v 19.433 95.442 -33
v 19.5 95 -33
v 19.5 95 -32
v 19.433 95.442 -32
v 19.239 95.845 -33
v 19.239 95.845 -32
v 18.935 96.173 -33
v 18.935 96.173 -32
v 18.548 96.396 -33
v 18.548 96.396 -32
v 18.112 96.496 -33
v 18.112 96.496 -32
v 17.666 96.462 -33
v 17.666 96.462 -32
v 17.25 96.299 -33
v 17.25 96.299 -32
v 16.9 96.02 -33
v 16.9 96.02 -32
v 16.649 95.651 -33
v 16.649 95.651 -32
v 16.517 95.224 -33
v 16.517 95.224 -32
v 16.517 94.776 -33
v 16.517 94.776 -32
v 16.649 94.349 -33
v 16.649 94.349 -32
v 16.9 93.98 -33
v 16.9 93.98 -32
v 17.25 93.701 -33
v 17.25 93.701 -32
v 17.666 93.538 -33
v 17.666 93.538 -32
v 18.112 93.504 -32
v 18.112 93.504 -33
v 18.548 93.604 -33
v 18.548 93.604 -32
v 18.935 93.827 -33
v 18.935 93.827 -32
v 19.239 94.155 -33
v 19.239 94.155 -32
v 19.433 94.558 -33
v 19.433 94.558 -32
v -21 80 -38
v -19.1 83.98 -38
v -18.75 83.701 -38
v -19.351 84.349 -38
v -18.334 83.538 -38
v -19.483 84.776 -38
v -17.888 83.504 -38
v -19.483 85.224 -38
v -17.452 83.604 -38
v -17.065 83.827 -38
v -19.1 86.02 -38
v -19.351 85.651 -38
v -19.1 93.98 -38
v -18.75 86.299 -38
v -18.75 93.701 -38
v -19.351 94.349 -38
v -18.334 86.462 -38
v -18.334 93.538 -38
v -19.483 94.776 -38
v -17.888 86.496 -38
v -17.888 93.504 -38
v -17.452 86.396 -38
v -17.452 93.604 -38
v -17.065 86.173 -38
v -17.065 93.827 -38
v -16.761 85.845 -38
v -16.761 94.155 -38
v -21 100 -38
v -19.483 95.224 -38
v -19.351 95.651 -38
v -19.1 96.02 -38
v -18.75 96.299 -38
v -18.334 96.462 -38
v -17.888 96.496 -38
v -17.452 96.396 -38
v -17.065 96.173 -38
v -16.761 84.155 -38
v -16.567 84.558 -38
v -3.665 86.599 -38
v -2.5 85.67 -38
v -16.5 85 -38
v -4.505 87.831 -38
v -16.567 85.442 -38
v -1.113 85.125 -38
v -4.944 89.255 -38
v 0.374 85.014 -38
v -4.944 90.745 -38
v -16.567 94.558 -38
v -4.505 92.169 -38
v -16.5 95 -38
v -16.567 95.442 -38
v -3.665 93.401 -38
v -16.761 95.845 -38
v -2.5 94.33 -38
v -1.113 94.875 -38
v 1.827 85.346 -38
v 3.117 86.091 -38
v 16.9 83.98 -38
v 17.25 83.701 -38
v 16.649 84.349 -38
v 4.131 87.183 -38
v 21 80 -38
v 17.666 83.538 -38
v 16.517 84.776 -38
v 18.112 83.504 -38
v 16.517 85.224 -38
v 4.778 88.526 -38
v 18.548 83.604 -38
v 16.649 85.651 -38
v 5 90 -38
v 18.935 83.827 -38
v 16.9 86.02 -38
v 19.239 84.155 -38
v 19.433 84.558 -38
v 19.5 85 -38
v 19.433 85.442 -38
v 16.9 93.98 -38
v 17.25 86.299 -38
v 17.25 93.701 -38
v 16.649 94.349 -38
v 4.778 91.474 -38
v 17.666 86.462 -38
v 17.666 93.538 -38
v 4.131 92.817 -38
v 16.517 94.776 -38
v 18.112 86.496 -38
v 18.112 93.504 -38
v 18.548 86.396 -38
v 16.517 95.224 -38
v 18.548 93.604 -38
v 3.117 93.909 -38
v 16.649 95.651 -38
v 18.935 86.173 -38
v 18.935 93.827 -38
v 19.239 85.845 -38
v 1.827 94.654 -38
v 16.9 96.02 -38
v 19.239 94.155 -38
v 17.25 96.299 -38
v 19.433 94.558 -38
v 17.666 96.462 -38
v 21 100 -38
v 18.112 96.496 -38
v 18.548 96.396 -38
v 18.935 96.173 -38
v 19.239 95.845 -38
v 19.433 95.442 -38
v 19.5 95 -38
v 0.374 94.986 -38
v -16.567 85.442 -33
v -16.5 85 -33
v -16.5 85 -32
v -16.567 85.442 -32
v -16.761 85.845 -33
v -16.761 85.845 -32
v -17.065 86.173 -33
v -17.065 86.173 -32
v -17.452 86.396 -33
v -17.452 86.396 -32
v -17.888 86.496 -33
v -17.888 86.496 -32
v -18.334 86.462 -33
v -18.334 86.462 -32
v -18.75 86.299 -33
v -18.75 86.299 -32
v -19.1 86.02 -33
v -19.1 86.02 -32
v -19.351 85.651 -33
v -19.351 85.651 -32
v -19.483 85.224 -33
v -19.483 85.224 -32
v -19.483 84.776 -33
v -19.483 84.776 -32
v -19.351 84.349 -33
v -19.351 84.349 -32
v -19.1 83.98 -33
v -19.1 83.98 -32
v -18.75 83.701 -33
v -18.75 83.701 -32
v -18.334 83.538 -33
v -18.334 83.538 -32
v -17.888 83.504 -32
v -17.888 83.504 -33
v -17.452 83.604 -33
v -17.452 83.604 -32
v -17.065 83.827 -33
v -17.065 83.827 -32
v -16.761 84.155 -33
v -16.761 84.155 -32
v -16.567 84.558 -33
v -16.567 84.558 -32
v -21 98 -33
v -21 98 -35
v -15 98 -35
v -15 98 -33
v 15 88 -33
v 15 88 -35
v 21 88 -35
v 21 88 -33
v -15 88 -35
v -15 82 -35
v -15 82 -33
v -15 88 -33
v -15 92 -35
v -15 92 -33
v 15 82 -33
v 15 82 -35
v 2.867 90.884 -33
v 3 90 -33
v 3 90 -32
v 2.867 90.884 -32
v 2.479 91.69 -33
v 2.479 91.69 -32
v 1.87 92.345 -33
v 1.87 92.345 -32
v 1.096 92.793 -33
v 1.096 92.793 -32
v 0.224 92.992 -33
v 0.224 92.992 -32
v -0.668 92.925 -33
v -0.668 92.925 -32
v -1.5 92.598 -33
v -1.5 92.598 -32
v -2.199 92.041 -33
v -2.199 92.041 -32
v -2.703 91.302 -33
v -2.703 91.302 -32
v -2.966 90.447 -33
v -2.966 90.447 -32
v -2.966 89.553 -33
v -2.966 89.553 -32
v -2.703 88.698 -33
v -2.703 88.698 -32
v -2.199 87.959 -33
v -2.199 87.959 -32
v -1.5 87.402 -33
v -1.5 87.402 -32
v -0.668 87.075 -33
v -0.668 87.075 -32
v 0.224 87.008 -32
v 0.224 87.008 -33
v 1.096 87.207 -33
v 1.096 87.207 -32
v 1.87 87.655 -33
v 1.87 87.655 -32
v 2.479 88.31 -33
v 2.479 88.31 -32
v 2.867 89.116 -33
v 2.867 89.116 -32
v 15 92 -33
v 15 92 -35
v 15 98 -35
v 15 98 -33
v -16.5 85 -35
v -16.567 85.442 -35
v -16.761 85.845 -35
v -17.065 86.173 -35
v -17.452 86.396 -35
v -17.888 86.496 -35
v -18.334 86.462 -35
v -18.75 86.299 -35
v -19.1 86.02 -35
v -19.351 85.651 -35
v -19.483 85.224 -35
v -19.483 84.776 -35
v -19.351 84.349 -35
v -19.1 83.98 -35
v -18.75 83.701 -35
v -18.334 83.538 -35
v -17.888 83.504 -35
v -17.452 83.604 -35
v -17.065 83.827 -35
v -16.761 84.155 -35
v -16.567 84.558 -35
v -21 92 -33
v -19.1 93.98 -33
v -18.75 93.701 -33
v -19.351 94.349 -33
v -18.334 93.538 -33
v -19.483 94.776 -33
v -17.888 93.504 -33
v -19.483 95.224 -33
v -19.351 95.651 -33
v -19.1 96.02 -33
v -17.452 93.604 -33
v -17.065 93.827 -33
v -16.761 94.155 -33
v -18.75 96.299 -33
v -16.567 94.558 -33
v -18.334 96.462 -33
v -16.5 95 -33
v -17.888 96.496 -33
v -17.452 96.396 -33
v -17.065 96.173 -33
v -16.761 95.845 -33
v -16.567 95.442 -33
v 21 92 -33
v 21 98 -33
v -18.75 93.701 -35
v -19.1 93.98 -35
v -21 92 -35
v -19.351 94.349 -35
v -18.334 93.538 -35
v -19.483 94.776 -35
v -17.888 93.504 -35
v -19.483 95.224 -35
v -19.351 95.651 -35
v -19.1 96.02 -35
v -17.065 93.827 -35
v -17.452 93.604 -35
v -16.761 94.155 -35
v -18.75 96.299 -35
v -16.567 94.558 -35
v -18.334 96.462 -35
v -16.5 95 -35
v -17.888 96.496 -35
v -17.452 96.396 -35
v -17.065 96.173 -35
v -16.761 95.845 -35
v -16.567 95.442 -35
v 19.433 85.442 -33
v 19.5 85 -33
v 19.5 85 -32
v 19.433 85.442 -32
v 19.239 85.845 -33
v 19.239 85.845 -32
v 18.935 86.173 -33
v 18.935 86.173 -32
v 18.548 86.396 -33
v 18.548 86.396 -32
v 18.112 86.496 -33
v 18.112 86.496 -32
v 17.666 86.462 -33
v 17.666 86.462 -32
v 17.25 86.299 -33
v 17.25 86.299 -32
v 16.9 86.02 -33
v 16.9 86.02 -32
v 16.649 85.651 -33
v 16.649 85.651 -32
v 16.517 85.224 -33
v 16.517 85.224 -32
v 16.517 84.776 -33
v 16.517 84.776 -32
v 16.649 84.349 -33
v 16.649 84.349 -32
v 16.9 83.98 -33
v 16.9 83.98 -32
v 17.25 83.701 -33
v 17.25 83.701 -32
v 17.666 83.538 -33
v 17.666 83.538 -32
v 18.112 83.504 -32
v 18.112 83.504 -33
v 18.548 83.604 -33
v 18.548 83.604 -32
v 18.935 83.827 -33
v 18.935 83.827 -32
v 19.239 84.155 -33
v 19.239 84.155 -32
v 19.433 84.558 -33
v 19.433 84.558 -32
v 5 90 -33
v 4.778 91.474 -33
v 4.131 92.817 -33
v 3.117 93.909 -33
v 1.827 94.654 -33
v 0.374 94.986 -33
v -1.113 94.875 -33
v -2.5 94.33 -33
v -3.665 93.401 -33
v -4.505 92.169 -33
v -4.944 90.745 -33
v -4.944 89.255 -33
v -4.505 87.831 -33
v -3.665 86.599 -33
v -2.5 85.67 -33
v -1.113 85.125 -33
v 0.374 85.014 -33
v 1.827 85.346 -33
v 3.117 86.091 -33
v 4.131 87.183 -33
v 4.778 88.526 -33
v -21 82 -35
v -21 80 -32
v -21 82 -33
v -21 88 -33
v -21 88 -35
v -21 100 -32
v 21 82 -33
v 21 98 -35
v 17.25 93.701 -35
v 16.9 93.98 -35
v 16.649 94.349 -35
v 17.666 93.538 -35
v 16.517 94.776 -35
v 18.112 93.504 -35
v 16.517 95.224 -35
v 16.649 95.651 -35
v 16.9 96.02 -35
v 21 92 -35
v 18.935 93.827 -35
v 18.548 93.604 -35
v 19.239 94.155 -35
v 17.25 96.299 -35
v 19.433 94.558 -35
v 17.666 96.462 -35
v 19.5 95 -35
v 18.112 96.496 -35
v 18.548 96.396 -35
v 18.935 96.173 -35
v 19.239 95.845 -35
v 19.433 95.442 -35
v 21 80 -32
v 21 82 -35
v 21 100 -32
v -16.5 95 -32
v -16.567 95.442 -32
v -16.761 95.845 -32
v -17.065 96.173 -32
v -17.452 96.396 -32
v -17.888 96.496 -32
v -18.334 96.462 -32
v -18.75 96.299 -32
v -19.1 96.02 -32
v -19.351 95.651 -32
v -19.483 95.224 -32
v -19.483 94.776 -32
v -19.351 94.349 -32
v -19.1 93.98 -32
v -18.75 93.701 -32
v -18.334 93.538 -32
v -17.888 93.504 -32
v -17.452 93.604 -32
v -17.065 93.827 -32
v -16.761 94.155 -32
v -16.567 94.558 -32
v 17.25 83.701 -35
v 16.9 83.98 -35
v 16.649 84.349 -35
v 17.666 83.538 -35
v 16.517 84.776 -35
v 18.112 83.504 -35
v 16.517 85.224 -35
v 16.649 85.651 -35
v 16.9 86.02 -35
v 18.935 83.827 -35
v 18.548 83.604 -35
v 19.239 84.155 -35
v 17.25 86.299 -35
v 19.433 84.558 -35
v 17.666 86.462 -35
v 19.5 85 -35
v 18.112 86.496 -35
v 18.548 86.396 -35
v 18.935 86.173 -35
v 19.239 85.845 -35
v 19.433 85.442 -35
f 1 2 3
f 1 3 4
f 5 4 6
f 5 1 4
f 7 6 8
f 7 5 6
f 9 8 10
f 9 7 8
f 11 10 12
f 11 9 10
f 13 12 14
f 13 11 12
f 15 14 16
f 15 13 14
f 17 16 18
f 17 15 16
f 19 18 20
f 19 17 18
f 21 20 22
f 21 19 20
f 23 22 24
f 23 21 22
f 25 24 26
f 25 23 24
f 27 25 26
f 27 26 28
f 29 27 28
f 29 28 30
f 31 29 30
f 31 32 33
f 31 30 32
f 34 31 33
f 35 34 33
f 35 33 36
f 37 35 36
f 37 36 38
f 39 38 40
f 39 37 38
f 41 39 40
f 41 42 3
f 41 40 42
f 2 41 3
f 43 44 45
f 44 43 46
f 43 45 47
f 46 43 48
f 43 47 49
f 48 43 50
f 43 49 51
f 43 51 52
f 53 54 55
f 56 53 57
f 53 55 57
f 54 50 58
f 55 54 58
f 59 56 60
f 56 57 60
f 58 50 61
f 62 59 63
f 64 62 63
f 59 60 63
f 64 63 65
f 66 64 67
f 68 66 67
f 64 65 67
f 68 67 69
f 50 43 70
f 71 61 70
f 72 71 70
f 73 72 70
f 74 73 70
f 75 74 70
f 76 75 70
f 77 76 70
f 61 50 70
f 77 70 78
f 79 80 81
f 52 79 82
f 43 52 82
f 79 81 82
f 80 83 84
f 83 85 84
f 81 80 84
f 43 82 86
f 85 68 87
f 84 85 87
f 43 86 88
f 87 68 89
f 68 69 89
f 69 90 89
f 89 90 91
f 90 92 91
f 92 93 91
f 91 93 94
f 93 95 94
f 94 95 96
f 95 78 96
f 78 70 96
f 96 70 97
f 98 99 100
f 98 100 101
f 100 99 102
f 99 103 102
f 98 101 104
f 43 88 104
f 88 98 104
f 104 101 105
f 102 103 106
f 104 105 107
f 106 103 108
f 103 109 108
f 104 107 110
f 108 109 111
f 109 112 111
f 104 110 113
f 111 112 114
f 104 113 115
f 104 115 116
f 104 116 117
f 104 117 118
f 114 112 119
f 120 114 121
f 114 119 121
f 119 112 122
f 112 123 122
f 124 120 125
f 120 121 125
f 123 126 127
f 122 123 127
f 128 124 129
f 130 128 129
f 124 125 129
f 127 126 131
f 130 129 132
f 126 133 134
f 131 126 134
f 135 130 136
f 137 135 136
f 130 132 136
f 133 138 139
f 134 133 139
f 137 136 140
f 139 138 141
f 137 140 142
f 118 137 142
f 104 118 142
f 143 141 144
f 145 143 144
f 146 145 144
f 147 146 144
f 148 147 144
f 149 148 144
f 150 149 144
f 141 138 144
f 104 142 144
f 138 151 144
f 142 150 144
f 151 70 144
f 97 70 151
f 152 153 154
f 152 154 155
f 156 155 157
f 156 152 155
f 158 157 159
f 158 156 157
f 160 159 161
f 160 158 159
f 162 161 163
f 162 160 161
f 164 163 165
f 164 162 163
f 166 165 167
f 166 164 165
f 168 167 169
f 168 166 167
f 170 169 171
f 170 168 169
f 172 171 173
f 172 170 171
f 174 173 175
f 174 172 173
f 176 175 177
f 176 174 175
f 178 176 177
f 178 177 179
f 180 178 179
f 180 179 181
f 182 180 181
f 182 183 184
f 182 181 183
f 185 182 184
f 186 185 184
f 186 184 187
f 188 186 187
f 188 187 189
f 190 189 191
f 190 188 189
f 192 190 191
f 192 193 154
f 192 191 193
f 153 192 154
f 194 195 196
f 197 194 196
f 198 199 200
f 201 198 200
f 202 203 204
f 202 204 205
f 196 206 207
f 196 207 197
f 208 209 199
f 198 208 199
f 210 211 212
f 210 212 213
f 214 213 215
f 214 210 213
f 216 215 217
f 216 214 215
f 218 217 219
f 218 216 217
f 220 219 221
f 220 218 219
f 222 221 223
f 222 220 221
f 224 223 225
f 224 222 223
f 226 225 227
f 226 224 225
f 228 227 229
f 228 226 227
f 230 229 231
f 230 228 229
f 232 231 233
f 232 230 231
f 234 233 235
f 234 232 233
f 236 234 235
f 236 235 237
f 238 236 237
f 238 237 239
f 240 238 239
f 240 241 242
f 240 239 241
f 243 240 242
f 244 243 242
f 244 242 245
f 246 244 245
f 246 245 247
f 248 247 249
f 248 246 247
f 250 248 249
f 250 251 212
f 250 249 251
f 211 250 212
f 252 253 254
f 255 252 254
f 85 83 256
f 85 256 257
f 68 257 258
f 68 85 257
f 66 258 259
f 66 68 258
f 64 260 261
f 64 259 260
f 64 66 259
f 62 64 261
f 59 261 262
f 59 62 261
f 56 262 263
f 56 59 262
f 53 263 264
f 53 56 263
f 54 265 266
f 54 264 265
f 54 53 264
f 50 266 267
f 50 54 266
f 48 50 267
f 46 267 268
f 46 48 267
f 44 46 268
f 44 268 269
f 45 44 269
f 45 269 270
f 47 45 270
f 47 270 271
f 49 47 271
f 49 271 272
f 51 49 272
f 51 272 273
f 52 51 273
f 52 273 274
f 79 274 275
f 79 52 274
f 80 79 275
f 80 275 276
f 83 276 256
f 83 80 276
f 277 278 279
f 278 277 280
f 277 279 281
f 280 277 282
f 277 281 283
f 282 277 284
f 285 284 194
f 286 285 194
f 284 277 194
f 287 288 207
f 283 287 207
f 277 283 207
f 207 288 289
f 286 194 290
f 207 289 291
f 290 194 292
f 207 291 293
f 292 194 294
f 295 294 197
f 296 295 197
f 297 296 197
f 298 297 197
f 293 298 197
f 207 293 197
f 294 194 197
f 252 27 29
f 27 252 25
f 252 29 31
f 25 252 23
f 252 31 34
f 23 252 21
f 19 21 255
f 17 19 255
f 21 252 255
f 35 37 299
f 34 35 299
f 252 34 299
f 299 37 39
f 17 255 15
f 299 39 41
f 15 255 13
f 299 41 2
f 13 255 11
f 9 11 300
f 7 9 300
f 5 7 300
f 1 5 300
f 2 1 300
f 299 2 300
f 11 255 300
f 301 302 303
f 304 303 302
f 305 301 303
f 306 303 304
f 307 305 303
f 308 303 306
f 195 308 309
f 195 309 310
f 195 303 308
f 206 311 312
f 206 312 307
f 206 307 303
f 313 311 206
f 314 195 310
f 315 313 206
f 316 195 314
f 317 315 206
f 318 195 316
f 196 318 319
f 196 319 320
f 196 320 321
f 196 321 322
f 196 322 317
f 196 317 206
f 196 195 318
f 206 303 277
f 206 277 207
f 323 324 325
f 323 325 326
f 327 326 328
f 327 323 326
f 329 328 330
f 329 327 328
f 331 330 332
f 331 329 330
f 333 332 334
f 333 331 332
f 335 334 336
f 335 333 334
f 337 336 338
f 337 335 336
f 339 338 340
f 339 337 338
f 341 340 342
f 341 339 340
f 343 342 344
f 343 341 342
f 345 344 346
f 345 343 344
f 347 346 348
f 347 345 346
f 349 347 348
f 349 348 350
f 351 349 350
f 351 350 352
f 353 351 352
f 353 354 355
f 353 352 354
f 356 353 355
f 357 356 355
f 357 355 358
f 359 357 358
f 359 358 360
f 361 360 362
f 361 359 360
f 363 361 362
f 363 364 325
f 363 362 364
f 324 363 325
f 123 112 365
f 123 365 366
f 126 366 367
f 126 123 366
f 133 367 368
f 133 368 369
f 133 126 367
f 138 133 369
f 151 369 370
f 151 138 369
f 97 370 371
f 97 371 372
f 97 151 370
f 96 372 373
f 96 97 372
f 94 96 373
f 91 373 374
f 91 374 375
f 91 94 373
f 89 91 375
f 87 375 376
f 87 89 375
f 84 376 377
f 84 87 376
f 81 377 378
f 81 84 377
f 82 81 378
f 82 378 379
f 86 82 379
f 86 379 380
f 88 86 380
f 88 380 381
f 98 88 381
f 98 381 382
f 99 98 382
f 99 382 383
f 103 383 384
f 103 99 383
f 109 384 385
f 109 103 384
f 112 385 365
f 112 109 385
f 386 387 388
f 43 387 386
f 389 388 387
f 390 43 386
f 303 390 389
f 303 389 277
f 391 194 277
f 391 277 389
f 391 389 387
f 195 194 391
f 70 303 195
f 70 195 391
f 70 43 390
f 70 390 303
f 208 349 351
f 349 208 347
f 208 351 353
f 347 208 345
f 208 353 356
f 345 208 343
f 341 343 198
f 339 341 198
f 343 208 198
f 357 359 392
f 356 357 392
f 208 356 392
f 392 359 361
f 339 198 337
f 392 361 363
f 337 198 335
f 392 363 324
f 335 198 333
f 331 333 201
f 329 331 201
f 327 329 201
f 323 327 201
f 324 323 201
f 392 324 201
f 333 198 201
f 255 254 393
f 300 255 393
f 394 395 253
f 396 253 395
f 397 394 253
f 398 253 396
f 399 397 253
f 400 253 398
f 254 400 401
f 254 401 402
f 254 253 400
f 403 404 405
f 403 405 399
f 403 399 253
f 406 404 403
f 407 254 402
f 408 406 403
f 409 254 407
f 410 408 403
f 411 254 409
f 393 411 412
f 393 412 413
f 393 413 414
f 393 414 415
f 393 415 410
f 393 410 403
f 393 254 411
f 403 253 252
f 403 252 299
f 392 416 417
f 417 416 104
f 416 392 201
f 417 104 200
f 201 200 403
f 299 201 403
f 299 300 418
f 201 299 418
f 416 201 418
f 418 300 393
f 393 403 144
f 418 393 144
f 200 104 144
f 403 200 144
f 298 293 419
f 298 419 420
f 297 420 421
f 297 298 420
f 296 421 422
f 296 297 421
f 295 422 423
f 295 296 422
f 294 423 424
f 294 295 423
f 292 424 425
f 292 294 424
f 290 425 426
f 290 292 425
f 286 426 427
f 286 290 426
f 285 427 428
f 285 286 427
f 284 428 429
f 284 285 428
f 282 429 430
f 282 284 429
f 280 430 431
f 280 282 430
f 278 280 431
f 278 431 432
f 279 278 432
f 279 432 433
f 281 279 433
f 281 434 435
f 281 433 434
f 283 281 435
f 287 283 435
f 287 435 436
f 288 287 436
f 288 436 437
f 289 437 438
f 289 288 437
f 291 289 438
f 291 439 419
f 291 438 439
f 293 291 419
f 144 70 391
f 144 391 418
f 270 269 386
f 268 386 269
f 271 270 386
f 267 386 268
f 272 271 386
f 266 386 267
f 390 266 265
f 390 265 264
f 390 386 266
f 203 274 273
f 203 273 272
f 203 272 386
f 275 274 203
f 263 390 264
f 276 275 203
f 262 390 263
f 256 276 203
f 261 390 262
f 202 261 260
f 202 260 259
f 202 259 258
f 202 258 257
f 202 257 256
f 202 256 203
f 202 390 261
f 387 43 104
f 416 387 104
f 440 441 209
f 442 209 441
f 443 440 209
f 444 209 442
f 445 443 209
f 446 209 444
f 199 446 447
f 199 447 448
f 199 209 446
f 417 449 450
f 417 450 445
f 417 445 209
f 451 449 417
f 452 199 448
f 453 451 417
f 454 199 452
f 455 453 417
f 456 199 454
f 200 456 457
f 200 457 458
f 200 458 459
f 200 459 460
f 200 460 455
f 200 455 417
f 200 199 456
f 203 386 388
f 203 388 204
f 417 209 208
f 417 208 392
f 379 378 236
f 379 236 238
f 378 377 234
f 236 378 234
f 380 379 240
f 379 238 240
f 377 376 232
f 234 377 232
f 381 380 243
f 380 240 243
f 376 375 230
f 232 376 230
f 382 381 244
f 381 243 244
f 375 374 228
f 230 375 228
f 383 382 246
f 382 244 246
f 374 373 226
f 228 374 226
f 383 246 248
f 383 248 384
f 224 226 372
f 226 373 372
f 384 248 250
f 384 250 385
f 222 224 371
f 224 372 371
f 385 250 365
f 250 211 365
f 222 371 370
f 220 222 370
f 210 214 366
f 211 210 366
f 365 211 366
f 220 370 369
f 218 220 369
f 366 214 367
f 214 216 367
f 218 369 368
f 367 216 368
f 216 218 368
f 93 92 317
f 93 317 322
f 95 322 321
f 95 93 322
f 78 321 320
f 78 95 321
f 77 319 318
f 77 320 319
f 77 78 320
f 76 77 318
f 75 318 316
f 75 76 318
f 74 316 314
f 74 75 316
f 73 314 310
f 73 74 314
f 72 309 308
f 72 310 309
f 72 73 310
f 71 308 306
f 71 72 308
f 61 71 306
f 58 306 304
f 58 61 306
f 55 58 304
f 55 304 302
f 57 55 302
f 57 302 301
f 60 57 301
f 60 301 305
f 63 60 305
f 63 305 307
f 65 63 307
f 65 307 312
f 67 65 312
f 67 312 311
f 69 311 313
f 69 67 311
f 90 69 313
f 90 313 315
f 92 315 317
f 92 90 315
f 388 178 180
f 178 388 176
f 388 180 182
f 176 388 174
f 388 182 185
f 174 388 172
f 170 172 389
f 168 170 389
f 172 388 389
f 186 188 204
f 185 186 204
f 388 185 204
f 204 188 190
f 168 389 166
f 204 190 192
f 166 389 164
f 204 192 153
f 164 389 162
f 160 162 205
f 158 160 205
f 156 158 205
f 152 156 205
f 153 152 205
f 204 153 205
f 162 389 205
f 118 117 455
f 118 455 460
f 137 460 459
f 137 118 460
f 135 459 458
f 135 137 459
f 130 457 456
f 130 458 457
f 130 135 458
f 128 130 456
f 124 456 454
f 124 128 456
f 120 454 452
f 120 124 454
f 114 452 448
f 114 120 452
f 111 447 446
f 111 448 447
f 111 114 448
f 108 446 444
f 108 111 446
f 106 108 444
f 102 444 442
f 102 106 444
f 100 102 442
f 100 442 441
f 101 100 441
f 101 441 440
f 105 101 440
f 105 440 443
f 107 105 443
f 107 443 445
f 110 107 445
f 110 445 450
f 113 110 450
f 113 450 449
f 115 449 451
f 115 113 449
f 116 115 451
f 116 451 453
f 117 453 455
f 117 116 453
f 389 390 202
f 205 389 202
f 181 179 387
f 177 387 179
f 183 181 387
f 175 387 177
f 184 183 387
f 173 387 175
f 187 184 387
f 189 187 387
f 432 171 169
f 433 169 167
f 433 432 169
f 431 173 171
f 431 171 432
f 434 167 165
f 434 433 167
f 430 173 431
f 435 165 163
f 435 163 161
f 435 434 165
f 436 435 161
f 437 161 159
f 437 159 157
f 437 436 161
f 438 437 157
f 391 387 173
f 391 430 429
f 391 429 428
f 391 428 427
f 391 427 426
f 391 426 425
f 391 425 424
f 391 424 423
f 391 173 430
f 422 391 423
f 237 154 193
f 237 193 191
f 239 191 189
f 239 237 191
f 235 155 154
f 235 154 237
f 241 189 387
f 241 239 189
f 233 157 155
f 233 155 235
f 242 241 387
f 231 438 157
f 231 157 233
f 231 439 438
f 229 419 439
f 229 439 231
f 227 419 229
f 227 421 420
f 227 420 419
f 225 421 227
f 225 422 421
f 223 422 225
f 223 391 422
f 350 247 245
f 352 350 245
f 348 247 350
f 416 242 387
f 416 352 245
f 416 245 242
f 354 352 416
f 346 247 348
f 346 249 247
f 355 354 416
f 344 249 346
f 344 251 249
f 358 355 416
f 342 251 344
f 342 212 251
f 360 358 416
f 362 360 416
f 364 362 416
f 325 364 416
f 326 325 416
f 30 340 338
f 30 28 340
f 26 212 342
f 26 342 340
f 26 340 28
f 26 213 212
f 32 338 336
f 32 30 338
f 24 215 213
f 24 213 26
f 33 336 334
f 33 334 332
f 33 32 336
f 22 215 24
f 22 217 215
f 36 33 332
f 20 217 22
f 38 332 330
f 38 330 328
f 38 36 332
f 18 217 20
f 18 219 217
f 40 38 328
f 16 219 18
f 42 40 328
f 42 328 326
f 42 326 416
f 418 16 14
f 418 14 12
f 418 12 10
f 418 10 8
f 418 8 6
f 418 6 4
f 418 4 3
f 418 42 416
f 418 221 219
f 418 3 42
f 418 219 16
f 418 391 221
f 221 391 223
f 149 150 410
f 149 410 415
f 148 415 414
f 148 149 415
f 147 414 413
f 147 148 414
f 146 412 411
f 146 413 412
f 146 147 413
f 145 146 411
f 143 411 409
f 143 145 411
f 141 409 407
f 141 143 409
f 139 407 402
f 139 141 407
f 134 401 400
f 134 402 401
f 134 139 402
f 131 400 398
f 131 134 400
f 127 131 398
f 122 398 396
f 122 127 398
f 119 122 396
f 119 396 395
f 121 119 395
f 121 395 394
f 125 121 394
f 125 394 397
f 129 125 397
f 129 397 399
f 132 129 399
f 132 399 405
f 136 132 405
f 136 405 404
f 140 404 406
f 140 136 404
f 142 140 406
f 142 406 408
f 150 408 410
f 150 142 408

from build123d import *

# Parameters (mm, degrees)
CYLINDER1707_R     = 1.5
CYLINDER1707_DEPTH = 60
CYLINDER1708_R     = 1.5
CYLINDER1708_DEPTH = 60
CYLINDER1704_R     = 1.5
CYLINDER1704_DEPTH = 60
CYLINDER1705_R     = 1.5
CYLINDER1705_DEPTH = 60
BOX662_W           = 6
BOX662_H           = 6
BOX662_DEPTH       = 2
BOX664_W           = 6
BOX664_H           = 6
BOX664_DEPTH       = 2
BOX663_W           = 6
BOX663_H           = 6
BOX663_DEPTH       = 2
BOX661_W           = 6
BOX661_H           = 6
BOX661_DEPTH       = 2
CYLINDER1700_R     = 5
CYLINDER1700_DEPTH = 5
CYLINDER1699_R     = 3
CYLINDER1699_DEPTH = 48
BOX660_W           = 42
BOX660_H           = 20
BOX660_DEPTH       = 6


with BuildPart() as v_lec1707:
    # Cylinder1707 → Cylinder1707 (new body)
    with BuildSketch(Plane(origin=(18, 85, -57), x_dir=(1, 0, 0), z_dir=(0, 0, 1))):
        Circle(CYLINDER1707_R)
    extrude(amount=CYLINDER1707_DEPTH)


with BuildPart() as v_lec1708:
    # Cylinder1708 → Cylinder1708 (new body)
    with BuildSketch(Plane(origin=(-18, 85, -57), x_dir=(1, 0, 0), z_dir=(0, 0, 1))):
        Circle(CYLINDER1708_R)
    extrude(amount=CYLINDER1708_DEPTH)


with BuildPart() as v_lec1704:
    # Cylinder1704 → Cylinder1704 (new body)
    with BuildSketch(Plane(origin=(-18, 95, -57), x_dir=(1, 0, 0), z_dir=(0, 0, 1))):
        Circle(CYLINDER1704_R)
    extrude(amount=CYLINDER1704_DEPTH)


with BuildPart() as compound849:
    # Cylinder1705 → Cylinder1705 (new body)
    with BuildSketch(Plane(origin=(18, 95, -57), x_dir=(1, 0, 0), z_dir=(0, 0, 1))):
        Circle(CYLINDER1705_R)
    extrude(amount=CYLINDER1705_DEPTH)

    # Compound849: union Válec1707, Válec1708, Válec1704
    add(v_lec1707.part)
    add(v_lec1708.part)
    add(v_lec1704.part)


with BuildPart() as krychle662:
    # Box662 → Box662 (new body)
    with BuildSketch(Plane(origin=(-21, 92, -56), x_dir=(1, 0, 0), z_dir=(0, 0, 1))):
        with Locations((3, 3)):
            Rectangle(BOX662_W, BOX662_H)
    extrude(amount=BOX662_DEPTH)


with BuildPart() as krychle664:
    # Box664 → Box664 (new body)
    with BuildSketch(Plane(origin=(15, 82, -56), x_dir=(1, 0, 0), z_dir=(0, 0, 1))):
        with Locations((3, 3)):
            Rectangle(BOX664_W, BOX664_H)
    extrude(amount=BOX664_DEPTH)


with BuildPart() as krychle663:
    # Box663 → Box663 (new body)
    with BuildSketch(Plane(origin=(15, 92, -56), x_dir=(1, 0, 0), z_dir=(0, 0, 1))):
        with Locations((3, 3)):
            Rectangle(BOX663_W, BOX663_H)
    extrude(amount=BOX663_DEPTH)


with BuildPart() as compound848:
    # Box661 → Box661 (new body)
    with BuildSketch(Plane(origin=(-21, 82, -56), x_dir=(1, 0, 0), z_dir=(0, 0, 1))):
        with Locations((3, 3)):
            Rectangle(BOX661_W, BOX661_H)
    extrude(amount=BOX661_DEPTH)

    # Compound848: union Krychle662, Krychle664, Krychle663
    add(krychle662.part)
    add(krychle664.part)
    add(krychle663.part)


with BuildPart() as compound848_1:
    # Compound848 placement: moved
    add(compound848.part.moved(Location((0, 0, 21))))


with BuildPart() as v_lec1700:
    # Cylinder1700 → Cylinder1700 (new body)
    with BuildSketch(Plane(origin=(0, 90, -38), x_dir=(1, 0, 0), z_dir=(0, 0, 1))):
        Circle(CYLINDER1700_R)
    extrude(amount=CYLINDER1700_DEPTH)


with BuildPart() as v_lec1699:
    # Cylinder1699 → Cylinder1699 (new body)
    with BuildSketch(Plane(origin=(0, 90, -55), x_dir=(1, 0, 0), z_dir=(0, 0, 1))):
        Circle(CYLINDER1699_R)
    extrude(amount=CYLINDER1699_DEPTH)


with BuildPart() as cut355:
    # Box660 → Box660 (new body)
    with BuildSketch(Plane(origin=(-21, 80, -38), x_dir=(1, 0, 0), z_dir=(0, 0, 1))):
        with Locations((21, 10)):
            Rectangle(BOX660_W, BOX660_H)
    extrude(amount=BOX660_DEPTH)

    # Cut347: cut Válec1699
    add(v_lec1699.part, mode=Mode.SUBTRACT)

    # Cut346: cut Válec1700
    add(v_lec1700.part, mode=Mode.SUBTRACT)

    # Cut349: cut Compound848
    add(compound848_1.part, mode=Mode.SUBTRACT)

    # Cut355: cut Compound849
    add(compound849.part, mode=Mode.SUBTRACT)


solid = cut355.part
